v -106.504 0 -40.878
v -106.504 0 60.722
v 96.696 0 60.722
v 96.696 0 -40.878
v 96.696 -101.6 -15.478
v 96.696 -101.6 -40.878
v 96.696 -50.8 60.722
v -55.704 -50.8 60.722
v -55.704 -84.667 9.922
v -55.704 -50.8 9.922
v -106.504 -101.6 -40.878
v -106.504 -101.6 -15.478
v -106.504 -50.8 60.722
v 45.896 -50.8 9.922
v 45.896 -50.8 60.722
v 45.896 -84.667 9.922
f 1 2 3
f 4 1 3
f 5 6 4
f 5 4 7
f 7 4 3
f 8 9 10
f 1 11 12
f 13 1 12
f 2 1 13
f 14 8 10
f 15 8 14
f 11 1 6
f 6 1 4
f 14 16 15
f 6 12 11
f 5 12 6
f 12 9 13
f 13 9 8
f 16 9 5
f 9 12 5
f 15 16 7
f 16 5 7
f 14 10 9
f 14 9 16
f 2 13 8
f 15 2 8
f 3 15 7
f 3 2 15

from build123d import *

# Parameters (mm, degrees)
F0_W     = 203.2
F0_H     = 101.6
F1_DEPTH = 101.6
F3_DEPTH = 203.2
F4_W     = 101.6
F4_H     = 40.903057
F5_DEPTH = 50.8


with BuildPart() as f1:
    # F0 (on Front) → F1 (new body)
    with BuildSketch(Plane.XZ):
        with Locations((-4.904039, 9.921888)):
            Rectangle(F0_W, F0_H)
    extrude(amount=F1_DEPTH)

    # F2 (on face) → F3 (cut)
    with BuildSketch(Plane.YZ.offset(96.695961)):
        Polygon((-101.6, 60.721888), (-101.6, -15.478112), (-50.8, 60.721888), align=None)
    extrude(amount=-F3_DEPTH, mode=Mode.SUBTRACT)

    # F4 (on face) → F5 (cut)
    with BuildSketch(Plane.XY.offset(60.721888)):
        with Locations((-4.904039, -71.251529)):
            Rectangle(F4_W, F4_H)
    extrude(amount=-F5_DEPTH, mode=Mode.SUBTRACT)


solid = f1.part
